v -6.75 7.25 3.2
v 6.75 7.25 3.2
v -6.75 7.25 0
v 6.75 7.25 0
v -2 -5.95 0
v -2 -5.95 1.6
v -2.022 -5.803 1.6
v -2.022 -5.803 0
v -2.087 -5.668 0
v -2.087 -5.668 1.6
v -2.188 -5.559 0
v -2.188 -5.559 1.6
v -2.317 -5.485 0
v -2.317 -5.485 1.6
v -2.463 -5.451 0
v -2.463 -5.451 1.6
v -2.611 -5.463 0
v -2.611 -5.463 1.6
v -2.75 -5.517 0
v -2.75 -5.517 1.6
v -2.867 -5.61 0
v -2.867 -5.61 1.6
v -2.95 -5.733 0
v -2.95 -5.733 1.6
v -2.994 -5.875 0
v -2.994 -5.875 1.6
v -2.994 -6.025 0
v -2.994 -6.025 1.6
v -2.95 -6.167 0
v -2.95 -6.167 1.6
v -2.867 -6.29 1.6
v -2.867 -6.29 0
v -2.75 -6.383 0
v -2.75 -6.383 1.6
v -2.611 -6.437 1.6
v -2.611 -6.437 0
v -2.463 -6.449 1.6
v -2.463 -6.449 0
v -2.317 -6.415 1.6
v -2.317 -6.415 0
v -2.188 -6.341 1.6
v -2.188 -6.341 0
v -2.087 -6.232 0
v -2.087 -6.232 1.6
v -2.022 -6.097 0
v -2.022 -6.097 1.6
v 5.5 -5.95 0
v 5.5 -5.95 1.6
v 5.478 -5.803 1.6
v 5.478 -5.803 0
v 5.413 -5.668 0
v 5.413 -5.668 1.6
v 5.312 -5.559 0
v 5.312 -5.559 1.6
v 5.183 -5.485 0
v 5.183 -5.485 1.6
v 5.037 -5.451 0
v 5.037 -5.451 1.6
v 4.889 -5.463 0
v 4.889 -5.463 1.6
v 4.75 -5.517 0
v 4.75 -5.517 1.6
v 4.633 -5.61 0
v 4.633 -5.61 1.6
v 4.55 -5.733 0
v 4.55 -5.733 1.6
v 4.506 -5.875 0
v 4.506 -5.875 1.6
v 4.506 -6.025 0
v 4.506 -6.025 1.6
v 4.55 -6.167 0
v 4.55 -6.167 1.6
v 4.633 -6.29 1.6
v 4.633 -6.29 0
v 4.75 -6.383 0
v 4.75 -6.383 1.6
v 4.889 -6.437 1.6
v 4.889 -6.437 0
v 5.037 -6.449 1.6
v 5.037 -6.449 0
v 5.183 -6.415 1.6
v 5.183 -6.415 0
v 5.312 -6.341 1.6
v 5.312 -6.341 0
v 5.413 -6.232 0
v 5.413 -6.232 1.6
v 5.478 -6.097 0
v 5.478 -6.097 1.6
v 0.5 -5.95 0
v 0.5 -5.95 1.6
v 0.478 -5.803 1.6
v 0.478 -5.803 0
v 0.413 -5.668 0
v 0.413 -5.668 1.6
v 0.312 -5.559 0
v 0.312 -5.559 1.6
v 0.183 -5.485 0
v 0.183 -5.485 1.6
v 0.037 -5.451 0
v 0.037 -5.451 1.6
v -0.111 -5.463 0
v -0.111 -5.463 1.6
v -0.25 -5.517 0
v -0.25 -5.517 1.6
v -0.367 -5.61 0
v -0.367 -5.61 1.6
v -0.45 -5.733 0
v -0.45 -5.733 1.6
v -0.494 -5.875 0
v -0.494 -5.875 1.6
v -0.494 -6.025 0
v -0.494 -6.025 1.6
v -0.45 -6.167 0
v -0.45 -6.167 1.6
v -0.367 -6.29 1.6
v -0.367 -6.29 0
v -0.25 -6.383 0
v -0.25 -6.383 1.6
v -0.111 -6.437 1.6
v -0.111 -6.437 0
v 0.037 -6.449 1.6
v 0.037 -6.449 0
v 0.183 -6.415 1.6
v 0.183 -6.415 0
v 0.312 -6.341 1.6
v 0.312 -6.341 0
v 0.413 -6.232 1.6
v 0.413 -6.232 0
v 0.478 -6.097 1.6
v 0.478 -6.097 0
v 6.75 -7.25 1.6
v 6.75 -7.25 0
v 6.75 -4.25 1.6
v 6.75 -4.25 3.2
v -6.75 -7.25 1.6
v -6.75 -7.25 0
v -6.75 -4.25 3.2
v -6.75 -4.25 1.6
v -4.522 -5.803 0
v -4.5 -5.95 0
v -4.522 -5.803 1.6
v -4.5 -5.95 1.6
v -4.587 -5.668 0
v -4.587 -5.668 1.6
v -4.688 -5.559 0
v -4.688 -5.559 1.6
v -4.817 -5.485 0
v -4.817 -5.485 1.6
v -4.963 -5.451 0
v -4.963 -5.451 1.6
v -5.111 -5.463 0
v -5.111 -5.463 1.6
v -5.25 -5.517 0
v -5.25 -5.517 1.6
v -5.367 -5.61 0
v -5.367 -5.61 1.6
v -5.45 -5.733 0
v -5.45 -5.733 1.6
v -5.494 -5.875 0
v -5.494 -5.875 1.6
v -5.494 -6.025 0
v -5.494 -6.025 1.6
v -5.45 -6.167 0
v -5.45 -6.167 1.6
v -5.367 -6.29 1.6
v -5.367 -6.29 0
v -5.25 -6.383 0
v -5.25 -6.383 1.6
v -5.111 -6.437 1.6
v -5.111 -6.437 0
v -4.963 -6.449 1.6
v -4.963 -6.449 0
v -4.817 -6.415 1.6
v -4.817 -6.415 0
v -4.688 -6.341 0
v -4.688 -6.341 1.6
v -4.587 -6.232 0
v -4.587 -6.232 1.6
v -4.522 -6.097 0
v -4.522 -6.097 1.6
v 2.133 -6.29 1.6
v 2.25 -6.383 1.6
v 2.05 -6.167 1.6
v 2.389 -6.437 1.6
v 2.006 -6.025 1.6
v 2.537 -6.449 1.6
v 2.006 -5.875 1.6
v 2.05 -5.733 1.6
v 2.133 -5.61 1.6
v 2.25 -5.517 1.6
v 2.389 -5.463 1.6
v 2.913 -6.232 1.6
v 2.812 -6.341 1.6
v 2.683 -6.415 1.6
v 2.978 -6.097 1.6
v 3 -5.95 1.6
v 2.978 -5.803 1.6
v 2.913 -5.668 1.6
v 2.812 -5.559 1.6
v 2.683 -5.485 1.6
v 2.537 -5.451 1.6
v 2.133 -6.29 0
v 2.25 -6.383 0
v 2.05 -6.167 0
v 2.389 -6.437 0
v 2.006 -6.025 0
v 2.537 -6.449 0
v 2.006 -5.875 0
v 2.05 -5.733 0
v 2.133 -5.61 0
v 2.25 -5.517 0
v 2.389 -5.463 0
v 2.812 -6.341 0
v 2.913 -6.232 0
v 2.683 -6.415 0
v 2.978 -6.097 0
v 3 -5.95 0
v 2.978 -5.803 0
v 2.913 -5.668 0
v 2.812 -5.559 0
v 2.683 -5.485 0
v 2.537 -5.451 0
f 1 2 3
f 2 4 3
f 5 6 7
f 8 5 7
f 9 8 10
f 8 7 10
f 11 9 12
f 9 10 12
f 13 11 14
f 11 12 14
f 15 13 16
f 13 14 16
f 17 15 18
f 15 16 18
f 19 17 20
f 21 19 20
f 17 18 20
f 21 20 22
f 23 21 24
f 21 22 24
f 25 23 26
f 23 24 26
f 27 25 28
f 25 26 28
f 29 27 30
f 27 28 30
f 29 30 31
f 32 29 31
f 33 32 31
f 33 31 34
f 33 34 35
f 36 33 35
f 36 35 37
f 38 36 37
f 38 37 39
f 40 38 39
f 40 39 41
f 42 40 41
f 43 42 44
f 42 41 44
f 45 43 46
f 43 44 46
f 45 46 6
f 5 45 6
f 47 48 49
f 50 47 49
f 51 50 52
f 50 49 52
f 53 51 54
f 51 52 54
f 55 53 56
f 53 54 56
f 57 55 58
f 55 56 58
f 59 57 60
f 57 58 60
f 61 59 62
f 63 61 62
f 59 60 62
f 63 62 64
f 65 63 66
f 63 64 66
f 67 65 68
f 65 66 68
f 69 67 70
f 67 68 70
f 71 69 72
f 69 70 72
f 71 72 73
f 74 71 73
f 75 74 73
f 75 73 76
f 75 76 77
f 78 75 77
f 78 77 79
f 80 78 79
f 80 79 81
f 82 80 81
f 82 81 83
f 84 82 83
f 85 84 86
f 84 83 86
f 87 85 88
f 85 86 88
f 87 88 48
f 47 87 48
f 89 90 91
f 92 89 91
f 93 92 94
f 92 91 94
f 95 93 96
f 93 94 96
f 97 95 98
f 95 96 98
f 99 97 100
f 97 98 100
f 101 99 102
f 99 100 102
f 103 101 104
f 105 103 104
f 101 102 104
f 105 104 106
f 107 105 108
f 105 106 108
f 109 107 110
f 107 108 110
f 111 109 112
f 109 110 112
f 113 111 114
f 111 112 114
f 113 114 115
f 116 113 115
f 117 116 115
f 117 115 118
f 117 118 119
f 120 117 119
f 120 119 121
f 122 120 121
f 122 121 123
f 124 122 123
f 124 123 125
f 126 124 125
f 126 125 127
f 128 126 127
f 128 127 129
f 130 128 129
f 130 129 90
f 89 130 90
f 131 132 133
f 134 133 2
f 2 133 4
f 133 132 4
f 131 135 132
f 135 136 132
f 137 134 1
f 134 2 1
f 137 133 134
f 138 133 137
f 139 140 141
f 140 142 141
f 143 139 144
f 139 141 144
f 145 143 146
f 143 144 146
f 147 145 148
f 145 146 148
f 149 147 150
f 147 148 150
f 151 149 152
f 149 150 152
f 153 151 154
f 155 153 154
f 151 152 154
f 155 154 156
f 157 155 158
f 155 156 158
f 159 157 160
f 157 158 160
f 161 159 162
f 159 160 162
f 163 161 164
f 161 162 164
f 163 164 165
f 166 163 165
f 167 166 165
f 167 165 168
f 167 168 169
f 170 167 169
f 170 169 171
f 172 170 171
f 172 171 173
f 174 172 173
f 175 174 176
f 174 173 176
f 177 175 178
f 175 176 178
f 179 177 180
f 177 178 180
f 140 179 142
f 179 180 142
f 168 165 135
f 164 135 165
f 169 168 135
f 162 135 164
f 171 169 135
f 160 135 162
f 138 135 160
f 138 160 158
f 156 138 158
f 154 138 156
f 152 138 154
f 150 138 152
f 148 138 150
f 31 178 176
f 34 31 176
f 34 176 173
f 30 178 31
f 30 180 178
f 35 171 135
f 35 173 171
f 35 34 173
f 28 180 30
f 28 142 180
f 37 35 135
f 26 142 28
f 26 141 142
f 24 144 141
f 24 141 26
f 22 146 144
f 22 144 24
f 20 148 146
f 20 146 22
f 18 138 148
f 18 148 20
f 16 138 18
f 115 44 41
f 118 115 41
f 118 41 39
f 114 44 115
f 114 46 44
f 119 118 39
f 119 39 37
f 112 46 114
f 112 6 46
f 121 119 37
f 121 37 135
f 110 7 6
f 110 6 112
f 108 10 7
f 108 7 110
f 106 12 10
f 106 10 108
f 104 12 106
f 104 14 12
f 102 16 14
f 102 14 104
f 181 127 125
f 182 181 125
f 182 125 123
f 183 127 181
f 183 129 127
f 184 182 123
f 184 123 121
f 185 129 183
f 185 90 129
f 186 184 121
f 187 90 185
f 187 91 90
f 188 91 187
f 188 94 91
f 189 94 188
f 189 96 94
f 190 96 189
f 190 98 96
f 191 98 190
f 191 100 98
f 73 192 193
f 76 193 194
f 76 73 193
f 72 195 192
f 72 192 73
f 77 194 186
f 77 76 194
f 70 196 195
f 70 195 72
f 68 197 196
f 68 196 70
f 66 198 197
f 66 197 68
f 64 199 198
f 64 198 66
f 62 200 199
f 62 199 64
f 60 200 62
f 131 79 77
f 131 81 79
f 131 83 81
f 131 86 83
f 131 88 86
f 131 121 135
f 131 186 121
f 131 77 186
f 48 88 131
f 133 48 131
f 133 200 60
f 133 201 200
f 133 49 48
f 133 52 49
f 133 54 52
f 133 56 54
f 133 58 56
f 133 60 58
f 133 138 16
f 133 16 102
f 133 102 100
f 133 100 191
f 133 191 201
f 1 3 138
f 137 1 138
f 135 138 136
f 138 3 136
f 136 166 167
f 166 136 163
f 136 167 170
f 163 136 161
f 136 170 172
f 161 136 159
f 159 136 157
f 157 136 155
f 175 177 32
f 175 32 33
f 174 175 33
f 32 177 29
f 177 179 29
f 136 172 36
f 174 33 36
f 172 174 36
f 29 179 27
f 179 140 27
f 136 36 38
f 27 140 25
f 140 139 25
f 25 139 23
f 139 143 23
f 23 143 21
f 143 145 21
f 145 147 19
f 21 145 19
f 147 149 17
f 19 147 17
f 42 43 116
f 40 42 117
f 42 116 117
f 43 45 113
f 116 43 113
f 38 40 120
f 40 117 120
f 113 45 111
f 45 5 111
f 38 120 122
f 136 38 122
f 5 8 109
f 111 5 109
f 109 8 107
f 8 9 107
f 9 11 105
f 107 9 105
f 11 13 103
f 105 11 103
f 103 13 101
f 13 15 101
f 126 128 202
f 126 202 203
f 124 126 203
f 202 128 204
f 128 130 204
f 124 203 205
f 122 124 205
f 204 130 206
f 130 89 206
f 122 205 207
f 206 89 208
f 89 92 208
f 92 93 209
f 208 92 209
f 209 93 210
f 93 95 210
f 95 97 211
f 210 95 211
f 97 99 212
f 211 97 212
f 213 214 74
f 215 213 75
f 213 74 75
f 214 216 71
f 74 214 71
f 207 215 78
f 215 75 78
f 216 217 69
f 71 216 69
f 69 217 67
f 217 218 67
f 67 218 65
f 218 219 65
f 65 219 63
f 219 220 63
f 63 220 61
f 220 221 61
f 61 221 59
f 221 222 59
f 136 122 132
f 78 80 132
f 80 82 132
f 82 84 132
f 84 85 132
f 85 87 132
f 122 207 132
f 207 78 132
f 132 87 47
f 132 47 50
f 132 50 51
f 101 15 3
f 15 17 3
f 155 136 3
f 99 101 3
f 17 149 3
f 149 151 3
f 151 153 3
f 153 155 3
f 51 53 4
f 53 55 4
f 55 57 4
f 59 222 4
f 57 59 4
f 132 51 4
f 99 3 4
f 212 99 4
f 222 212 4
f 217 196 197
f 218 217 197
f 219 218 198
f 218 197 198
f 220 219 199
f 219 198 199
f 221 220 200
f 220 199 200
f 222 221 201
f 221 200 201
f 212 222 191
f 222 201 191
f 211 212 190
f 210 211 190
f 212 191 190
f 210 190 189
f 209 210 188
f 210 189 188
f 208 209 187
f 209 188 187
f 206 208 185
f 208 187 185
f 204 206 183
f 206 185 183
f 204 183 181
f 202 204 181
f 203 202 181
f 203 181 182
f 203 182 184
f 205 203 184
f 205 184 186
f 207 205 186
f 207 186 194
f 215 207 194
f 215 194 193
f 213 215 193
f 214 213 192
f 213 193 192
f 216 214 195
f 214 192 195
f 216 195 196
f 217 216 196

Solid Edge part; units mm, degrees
sketch "Sketch1" plane through (0, 0, 0) normal (0, 0, 1) x (1, 0, 0)
  line L0 (-6.75, -7.25) -> (6.75, -7.25)
  line L1 (6.75, -7.25) -> (6.75, 7.25)
  line L2 (6.75, 7.25) -> (-6.75, 7.25)
  line L3 (-6.75, 7.25) -> (-6.75, -7.25)
  dimension "D1" = 13.5
  dimension "D2" = 14.5
extrude "Protrusion1" add sketch "Sketch1" along normal blind 1.6
sketch "Sketch2" plane through (0, 0, 1.6) normal (0, 0, 1) x (1, 0, 0)
  circle A0 centre (-5, -5.95) radius 0.5
  circle A1 centre (-2.5, -5.95) radius 0.5
  circle A2 centre (0, -5.95) radius 0.5
  circle A3 centre (2.5, -5.95) radius 0.5
  circle A4 centre (5, -5.95) radius 0.5
  dimension "D1" = 1
  dimension "D2" = 2.5
  dimension "D3" = 1.3
extrude "Cutout1" cut sketch "Sketch2" against normal through all
sketch "Sketch3" plane through (0, 0, 1.6) normal (0, 0, 1) x (1, 0, 0)
  line L0 (-6.75, 7.25) -> (6.75, 7.25)
  line L1 (6.75, 7.25) -> (6.75, -4.25)
  line L2 (6.75, -4.25) -> (-6.75, -4.25)
  line L3 (-6.75, -4.25) -> (-6.75, 7.25)
  dimension "D1" = 3
extrude "Extrusionsausprägung_2" add sketch "Sketch3" along normal blind 1.6
